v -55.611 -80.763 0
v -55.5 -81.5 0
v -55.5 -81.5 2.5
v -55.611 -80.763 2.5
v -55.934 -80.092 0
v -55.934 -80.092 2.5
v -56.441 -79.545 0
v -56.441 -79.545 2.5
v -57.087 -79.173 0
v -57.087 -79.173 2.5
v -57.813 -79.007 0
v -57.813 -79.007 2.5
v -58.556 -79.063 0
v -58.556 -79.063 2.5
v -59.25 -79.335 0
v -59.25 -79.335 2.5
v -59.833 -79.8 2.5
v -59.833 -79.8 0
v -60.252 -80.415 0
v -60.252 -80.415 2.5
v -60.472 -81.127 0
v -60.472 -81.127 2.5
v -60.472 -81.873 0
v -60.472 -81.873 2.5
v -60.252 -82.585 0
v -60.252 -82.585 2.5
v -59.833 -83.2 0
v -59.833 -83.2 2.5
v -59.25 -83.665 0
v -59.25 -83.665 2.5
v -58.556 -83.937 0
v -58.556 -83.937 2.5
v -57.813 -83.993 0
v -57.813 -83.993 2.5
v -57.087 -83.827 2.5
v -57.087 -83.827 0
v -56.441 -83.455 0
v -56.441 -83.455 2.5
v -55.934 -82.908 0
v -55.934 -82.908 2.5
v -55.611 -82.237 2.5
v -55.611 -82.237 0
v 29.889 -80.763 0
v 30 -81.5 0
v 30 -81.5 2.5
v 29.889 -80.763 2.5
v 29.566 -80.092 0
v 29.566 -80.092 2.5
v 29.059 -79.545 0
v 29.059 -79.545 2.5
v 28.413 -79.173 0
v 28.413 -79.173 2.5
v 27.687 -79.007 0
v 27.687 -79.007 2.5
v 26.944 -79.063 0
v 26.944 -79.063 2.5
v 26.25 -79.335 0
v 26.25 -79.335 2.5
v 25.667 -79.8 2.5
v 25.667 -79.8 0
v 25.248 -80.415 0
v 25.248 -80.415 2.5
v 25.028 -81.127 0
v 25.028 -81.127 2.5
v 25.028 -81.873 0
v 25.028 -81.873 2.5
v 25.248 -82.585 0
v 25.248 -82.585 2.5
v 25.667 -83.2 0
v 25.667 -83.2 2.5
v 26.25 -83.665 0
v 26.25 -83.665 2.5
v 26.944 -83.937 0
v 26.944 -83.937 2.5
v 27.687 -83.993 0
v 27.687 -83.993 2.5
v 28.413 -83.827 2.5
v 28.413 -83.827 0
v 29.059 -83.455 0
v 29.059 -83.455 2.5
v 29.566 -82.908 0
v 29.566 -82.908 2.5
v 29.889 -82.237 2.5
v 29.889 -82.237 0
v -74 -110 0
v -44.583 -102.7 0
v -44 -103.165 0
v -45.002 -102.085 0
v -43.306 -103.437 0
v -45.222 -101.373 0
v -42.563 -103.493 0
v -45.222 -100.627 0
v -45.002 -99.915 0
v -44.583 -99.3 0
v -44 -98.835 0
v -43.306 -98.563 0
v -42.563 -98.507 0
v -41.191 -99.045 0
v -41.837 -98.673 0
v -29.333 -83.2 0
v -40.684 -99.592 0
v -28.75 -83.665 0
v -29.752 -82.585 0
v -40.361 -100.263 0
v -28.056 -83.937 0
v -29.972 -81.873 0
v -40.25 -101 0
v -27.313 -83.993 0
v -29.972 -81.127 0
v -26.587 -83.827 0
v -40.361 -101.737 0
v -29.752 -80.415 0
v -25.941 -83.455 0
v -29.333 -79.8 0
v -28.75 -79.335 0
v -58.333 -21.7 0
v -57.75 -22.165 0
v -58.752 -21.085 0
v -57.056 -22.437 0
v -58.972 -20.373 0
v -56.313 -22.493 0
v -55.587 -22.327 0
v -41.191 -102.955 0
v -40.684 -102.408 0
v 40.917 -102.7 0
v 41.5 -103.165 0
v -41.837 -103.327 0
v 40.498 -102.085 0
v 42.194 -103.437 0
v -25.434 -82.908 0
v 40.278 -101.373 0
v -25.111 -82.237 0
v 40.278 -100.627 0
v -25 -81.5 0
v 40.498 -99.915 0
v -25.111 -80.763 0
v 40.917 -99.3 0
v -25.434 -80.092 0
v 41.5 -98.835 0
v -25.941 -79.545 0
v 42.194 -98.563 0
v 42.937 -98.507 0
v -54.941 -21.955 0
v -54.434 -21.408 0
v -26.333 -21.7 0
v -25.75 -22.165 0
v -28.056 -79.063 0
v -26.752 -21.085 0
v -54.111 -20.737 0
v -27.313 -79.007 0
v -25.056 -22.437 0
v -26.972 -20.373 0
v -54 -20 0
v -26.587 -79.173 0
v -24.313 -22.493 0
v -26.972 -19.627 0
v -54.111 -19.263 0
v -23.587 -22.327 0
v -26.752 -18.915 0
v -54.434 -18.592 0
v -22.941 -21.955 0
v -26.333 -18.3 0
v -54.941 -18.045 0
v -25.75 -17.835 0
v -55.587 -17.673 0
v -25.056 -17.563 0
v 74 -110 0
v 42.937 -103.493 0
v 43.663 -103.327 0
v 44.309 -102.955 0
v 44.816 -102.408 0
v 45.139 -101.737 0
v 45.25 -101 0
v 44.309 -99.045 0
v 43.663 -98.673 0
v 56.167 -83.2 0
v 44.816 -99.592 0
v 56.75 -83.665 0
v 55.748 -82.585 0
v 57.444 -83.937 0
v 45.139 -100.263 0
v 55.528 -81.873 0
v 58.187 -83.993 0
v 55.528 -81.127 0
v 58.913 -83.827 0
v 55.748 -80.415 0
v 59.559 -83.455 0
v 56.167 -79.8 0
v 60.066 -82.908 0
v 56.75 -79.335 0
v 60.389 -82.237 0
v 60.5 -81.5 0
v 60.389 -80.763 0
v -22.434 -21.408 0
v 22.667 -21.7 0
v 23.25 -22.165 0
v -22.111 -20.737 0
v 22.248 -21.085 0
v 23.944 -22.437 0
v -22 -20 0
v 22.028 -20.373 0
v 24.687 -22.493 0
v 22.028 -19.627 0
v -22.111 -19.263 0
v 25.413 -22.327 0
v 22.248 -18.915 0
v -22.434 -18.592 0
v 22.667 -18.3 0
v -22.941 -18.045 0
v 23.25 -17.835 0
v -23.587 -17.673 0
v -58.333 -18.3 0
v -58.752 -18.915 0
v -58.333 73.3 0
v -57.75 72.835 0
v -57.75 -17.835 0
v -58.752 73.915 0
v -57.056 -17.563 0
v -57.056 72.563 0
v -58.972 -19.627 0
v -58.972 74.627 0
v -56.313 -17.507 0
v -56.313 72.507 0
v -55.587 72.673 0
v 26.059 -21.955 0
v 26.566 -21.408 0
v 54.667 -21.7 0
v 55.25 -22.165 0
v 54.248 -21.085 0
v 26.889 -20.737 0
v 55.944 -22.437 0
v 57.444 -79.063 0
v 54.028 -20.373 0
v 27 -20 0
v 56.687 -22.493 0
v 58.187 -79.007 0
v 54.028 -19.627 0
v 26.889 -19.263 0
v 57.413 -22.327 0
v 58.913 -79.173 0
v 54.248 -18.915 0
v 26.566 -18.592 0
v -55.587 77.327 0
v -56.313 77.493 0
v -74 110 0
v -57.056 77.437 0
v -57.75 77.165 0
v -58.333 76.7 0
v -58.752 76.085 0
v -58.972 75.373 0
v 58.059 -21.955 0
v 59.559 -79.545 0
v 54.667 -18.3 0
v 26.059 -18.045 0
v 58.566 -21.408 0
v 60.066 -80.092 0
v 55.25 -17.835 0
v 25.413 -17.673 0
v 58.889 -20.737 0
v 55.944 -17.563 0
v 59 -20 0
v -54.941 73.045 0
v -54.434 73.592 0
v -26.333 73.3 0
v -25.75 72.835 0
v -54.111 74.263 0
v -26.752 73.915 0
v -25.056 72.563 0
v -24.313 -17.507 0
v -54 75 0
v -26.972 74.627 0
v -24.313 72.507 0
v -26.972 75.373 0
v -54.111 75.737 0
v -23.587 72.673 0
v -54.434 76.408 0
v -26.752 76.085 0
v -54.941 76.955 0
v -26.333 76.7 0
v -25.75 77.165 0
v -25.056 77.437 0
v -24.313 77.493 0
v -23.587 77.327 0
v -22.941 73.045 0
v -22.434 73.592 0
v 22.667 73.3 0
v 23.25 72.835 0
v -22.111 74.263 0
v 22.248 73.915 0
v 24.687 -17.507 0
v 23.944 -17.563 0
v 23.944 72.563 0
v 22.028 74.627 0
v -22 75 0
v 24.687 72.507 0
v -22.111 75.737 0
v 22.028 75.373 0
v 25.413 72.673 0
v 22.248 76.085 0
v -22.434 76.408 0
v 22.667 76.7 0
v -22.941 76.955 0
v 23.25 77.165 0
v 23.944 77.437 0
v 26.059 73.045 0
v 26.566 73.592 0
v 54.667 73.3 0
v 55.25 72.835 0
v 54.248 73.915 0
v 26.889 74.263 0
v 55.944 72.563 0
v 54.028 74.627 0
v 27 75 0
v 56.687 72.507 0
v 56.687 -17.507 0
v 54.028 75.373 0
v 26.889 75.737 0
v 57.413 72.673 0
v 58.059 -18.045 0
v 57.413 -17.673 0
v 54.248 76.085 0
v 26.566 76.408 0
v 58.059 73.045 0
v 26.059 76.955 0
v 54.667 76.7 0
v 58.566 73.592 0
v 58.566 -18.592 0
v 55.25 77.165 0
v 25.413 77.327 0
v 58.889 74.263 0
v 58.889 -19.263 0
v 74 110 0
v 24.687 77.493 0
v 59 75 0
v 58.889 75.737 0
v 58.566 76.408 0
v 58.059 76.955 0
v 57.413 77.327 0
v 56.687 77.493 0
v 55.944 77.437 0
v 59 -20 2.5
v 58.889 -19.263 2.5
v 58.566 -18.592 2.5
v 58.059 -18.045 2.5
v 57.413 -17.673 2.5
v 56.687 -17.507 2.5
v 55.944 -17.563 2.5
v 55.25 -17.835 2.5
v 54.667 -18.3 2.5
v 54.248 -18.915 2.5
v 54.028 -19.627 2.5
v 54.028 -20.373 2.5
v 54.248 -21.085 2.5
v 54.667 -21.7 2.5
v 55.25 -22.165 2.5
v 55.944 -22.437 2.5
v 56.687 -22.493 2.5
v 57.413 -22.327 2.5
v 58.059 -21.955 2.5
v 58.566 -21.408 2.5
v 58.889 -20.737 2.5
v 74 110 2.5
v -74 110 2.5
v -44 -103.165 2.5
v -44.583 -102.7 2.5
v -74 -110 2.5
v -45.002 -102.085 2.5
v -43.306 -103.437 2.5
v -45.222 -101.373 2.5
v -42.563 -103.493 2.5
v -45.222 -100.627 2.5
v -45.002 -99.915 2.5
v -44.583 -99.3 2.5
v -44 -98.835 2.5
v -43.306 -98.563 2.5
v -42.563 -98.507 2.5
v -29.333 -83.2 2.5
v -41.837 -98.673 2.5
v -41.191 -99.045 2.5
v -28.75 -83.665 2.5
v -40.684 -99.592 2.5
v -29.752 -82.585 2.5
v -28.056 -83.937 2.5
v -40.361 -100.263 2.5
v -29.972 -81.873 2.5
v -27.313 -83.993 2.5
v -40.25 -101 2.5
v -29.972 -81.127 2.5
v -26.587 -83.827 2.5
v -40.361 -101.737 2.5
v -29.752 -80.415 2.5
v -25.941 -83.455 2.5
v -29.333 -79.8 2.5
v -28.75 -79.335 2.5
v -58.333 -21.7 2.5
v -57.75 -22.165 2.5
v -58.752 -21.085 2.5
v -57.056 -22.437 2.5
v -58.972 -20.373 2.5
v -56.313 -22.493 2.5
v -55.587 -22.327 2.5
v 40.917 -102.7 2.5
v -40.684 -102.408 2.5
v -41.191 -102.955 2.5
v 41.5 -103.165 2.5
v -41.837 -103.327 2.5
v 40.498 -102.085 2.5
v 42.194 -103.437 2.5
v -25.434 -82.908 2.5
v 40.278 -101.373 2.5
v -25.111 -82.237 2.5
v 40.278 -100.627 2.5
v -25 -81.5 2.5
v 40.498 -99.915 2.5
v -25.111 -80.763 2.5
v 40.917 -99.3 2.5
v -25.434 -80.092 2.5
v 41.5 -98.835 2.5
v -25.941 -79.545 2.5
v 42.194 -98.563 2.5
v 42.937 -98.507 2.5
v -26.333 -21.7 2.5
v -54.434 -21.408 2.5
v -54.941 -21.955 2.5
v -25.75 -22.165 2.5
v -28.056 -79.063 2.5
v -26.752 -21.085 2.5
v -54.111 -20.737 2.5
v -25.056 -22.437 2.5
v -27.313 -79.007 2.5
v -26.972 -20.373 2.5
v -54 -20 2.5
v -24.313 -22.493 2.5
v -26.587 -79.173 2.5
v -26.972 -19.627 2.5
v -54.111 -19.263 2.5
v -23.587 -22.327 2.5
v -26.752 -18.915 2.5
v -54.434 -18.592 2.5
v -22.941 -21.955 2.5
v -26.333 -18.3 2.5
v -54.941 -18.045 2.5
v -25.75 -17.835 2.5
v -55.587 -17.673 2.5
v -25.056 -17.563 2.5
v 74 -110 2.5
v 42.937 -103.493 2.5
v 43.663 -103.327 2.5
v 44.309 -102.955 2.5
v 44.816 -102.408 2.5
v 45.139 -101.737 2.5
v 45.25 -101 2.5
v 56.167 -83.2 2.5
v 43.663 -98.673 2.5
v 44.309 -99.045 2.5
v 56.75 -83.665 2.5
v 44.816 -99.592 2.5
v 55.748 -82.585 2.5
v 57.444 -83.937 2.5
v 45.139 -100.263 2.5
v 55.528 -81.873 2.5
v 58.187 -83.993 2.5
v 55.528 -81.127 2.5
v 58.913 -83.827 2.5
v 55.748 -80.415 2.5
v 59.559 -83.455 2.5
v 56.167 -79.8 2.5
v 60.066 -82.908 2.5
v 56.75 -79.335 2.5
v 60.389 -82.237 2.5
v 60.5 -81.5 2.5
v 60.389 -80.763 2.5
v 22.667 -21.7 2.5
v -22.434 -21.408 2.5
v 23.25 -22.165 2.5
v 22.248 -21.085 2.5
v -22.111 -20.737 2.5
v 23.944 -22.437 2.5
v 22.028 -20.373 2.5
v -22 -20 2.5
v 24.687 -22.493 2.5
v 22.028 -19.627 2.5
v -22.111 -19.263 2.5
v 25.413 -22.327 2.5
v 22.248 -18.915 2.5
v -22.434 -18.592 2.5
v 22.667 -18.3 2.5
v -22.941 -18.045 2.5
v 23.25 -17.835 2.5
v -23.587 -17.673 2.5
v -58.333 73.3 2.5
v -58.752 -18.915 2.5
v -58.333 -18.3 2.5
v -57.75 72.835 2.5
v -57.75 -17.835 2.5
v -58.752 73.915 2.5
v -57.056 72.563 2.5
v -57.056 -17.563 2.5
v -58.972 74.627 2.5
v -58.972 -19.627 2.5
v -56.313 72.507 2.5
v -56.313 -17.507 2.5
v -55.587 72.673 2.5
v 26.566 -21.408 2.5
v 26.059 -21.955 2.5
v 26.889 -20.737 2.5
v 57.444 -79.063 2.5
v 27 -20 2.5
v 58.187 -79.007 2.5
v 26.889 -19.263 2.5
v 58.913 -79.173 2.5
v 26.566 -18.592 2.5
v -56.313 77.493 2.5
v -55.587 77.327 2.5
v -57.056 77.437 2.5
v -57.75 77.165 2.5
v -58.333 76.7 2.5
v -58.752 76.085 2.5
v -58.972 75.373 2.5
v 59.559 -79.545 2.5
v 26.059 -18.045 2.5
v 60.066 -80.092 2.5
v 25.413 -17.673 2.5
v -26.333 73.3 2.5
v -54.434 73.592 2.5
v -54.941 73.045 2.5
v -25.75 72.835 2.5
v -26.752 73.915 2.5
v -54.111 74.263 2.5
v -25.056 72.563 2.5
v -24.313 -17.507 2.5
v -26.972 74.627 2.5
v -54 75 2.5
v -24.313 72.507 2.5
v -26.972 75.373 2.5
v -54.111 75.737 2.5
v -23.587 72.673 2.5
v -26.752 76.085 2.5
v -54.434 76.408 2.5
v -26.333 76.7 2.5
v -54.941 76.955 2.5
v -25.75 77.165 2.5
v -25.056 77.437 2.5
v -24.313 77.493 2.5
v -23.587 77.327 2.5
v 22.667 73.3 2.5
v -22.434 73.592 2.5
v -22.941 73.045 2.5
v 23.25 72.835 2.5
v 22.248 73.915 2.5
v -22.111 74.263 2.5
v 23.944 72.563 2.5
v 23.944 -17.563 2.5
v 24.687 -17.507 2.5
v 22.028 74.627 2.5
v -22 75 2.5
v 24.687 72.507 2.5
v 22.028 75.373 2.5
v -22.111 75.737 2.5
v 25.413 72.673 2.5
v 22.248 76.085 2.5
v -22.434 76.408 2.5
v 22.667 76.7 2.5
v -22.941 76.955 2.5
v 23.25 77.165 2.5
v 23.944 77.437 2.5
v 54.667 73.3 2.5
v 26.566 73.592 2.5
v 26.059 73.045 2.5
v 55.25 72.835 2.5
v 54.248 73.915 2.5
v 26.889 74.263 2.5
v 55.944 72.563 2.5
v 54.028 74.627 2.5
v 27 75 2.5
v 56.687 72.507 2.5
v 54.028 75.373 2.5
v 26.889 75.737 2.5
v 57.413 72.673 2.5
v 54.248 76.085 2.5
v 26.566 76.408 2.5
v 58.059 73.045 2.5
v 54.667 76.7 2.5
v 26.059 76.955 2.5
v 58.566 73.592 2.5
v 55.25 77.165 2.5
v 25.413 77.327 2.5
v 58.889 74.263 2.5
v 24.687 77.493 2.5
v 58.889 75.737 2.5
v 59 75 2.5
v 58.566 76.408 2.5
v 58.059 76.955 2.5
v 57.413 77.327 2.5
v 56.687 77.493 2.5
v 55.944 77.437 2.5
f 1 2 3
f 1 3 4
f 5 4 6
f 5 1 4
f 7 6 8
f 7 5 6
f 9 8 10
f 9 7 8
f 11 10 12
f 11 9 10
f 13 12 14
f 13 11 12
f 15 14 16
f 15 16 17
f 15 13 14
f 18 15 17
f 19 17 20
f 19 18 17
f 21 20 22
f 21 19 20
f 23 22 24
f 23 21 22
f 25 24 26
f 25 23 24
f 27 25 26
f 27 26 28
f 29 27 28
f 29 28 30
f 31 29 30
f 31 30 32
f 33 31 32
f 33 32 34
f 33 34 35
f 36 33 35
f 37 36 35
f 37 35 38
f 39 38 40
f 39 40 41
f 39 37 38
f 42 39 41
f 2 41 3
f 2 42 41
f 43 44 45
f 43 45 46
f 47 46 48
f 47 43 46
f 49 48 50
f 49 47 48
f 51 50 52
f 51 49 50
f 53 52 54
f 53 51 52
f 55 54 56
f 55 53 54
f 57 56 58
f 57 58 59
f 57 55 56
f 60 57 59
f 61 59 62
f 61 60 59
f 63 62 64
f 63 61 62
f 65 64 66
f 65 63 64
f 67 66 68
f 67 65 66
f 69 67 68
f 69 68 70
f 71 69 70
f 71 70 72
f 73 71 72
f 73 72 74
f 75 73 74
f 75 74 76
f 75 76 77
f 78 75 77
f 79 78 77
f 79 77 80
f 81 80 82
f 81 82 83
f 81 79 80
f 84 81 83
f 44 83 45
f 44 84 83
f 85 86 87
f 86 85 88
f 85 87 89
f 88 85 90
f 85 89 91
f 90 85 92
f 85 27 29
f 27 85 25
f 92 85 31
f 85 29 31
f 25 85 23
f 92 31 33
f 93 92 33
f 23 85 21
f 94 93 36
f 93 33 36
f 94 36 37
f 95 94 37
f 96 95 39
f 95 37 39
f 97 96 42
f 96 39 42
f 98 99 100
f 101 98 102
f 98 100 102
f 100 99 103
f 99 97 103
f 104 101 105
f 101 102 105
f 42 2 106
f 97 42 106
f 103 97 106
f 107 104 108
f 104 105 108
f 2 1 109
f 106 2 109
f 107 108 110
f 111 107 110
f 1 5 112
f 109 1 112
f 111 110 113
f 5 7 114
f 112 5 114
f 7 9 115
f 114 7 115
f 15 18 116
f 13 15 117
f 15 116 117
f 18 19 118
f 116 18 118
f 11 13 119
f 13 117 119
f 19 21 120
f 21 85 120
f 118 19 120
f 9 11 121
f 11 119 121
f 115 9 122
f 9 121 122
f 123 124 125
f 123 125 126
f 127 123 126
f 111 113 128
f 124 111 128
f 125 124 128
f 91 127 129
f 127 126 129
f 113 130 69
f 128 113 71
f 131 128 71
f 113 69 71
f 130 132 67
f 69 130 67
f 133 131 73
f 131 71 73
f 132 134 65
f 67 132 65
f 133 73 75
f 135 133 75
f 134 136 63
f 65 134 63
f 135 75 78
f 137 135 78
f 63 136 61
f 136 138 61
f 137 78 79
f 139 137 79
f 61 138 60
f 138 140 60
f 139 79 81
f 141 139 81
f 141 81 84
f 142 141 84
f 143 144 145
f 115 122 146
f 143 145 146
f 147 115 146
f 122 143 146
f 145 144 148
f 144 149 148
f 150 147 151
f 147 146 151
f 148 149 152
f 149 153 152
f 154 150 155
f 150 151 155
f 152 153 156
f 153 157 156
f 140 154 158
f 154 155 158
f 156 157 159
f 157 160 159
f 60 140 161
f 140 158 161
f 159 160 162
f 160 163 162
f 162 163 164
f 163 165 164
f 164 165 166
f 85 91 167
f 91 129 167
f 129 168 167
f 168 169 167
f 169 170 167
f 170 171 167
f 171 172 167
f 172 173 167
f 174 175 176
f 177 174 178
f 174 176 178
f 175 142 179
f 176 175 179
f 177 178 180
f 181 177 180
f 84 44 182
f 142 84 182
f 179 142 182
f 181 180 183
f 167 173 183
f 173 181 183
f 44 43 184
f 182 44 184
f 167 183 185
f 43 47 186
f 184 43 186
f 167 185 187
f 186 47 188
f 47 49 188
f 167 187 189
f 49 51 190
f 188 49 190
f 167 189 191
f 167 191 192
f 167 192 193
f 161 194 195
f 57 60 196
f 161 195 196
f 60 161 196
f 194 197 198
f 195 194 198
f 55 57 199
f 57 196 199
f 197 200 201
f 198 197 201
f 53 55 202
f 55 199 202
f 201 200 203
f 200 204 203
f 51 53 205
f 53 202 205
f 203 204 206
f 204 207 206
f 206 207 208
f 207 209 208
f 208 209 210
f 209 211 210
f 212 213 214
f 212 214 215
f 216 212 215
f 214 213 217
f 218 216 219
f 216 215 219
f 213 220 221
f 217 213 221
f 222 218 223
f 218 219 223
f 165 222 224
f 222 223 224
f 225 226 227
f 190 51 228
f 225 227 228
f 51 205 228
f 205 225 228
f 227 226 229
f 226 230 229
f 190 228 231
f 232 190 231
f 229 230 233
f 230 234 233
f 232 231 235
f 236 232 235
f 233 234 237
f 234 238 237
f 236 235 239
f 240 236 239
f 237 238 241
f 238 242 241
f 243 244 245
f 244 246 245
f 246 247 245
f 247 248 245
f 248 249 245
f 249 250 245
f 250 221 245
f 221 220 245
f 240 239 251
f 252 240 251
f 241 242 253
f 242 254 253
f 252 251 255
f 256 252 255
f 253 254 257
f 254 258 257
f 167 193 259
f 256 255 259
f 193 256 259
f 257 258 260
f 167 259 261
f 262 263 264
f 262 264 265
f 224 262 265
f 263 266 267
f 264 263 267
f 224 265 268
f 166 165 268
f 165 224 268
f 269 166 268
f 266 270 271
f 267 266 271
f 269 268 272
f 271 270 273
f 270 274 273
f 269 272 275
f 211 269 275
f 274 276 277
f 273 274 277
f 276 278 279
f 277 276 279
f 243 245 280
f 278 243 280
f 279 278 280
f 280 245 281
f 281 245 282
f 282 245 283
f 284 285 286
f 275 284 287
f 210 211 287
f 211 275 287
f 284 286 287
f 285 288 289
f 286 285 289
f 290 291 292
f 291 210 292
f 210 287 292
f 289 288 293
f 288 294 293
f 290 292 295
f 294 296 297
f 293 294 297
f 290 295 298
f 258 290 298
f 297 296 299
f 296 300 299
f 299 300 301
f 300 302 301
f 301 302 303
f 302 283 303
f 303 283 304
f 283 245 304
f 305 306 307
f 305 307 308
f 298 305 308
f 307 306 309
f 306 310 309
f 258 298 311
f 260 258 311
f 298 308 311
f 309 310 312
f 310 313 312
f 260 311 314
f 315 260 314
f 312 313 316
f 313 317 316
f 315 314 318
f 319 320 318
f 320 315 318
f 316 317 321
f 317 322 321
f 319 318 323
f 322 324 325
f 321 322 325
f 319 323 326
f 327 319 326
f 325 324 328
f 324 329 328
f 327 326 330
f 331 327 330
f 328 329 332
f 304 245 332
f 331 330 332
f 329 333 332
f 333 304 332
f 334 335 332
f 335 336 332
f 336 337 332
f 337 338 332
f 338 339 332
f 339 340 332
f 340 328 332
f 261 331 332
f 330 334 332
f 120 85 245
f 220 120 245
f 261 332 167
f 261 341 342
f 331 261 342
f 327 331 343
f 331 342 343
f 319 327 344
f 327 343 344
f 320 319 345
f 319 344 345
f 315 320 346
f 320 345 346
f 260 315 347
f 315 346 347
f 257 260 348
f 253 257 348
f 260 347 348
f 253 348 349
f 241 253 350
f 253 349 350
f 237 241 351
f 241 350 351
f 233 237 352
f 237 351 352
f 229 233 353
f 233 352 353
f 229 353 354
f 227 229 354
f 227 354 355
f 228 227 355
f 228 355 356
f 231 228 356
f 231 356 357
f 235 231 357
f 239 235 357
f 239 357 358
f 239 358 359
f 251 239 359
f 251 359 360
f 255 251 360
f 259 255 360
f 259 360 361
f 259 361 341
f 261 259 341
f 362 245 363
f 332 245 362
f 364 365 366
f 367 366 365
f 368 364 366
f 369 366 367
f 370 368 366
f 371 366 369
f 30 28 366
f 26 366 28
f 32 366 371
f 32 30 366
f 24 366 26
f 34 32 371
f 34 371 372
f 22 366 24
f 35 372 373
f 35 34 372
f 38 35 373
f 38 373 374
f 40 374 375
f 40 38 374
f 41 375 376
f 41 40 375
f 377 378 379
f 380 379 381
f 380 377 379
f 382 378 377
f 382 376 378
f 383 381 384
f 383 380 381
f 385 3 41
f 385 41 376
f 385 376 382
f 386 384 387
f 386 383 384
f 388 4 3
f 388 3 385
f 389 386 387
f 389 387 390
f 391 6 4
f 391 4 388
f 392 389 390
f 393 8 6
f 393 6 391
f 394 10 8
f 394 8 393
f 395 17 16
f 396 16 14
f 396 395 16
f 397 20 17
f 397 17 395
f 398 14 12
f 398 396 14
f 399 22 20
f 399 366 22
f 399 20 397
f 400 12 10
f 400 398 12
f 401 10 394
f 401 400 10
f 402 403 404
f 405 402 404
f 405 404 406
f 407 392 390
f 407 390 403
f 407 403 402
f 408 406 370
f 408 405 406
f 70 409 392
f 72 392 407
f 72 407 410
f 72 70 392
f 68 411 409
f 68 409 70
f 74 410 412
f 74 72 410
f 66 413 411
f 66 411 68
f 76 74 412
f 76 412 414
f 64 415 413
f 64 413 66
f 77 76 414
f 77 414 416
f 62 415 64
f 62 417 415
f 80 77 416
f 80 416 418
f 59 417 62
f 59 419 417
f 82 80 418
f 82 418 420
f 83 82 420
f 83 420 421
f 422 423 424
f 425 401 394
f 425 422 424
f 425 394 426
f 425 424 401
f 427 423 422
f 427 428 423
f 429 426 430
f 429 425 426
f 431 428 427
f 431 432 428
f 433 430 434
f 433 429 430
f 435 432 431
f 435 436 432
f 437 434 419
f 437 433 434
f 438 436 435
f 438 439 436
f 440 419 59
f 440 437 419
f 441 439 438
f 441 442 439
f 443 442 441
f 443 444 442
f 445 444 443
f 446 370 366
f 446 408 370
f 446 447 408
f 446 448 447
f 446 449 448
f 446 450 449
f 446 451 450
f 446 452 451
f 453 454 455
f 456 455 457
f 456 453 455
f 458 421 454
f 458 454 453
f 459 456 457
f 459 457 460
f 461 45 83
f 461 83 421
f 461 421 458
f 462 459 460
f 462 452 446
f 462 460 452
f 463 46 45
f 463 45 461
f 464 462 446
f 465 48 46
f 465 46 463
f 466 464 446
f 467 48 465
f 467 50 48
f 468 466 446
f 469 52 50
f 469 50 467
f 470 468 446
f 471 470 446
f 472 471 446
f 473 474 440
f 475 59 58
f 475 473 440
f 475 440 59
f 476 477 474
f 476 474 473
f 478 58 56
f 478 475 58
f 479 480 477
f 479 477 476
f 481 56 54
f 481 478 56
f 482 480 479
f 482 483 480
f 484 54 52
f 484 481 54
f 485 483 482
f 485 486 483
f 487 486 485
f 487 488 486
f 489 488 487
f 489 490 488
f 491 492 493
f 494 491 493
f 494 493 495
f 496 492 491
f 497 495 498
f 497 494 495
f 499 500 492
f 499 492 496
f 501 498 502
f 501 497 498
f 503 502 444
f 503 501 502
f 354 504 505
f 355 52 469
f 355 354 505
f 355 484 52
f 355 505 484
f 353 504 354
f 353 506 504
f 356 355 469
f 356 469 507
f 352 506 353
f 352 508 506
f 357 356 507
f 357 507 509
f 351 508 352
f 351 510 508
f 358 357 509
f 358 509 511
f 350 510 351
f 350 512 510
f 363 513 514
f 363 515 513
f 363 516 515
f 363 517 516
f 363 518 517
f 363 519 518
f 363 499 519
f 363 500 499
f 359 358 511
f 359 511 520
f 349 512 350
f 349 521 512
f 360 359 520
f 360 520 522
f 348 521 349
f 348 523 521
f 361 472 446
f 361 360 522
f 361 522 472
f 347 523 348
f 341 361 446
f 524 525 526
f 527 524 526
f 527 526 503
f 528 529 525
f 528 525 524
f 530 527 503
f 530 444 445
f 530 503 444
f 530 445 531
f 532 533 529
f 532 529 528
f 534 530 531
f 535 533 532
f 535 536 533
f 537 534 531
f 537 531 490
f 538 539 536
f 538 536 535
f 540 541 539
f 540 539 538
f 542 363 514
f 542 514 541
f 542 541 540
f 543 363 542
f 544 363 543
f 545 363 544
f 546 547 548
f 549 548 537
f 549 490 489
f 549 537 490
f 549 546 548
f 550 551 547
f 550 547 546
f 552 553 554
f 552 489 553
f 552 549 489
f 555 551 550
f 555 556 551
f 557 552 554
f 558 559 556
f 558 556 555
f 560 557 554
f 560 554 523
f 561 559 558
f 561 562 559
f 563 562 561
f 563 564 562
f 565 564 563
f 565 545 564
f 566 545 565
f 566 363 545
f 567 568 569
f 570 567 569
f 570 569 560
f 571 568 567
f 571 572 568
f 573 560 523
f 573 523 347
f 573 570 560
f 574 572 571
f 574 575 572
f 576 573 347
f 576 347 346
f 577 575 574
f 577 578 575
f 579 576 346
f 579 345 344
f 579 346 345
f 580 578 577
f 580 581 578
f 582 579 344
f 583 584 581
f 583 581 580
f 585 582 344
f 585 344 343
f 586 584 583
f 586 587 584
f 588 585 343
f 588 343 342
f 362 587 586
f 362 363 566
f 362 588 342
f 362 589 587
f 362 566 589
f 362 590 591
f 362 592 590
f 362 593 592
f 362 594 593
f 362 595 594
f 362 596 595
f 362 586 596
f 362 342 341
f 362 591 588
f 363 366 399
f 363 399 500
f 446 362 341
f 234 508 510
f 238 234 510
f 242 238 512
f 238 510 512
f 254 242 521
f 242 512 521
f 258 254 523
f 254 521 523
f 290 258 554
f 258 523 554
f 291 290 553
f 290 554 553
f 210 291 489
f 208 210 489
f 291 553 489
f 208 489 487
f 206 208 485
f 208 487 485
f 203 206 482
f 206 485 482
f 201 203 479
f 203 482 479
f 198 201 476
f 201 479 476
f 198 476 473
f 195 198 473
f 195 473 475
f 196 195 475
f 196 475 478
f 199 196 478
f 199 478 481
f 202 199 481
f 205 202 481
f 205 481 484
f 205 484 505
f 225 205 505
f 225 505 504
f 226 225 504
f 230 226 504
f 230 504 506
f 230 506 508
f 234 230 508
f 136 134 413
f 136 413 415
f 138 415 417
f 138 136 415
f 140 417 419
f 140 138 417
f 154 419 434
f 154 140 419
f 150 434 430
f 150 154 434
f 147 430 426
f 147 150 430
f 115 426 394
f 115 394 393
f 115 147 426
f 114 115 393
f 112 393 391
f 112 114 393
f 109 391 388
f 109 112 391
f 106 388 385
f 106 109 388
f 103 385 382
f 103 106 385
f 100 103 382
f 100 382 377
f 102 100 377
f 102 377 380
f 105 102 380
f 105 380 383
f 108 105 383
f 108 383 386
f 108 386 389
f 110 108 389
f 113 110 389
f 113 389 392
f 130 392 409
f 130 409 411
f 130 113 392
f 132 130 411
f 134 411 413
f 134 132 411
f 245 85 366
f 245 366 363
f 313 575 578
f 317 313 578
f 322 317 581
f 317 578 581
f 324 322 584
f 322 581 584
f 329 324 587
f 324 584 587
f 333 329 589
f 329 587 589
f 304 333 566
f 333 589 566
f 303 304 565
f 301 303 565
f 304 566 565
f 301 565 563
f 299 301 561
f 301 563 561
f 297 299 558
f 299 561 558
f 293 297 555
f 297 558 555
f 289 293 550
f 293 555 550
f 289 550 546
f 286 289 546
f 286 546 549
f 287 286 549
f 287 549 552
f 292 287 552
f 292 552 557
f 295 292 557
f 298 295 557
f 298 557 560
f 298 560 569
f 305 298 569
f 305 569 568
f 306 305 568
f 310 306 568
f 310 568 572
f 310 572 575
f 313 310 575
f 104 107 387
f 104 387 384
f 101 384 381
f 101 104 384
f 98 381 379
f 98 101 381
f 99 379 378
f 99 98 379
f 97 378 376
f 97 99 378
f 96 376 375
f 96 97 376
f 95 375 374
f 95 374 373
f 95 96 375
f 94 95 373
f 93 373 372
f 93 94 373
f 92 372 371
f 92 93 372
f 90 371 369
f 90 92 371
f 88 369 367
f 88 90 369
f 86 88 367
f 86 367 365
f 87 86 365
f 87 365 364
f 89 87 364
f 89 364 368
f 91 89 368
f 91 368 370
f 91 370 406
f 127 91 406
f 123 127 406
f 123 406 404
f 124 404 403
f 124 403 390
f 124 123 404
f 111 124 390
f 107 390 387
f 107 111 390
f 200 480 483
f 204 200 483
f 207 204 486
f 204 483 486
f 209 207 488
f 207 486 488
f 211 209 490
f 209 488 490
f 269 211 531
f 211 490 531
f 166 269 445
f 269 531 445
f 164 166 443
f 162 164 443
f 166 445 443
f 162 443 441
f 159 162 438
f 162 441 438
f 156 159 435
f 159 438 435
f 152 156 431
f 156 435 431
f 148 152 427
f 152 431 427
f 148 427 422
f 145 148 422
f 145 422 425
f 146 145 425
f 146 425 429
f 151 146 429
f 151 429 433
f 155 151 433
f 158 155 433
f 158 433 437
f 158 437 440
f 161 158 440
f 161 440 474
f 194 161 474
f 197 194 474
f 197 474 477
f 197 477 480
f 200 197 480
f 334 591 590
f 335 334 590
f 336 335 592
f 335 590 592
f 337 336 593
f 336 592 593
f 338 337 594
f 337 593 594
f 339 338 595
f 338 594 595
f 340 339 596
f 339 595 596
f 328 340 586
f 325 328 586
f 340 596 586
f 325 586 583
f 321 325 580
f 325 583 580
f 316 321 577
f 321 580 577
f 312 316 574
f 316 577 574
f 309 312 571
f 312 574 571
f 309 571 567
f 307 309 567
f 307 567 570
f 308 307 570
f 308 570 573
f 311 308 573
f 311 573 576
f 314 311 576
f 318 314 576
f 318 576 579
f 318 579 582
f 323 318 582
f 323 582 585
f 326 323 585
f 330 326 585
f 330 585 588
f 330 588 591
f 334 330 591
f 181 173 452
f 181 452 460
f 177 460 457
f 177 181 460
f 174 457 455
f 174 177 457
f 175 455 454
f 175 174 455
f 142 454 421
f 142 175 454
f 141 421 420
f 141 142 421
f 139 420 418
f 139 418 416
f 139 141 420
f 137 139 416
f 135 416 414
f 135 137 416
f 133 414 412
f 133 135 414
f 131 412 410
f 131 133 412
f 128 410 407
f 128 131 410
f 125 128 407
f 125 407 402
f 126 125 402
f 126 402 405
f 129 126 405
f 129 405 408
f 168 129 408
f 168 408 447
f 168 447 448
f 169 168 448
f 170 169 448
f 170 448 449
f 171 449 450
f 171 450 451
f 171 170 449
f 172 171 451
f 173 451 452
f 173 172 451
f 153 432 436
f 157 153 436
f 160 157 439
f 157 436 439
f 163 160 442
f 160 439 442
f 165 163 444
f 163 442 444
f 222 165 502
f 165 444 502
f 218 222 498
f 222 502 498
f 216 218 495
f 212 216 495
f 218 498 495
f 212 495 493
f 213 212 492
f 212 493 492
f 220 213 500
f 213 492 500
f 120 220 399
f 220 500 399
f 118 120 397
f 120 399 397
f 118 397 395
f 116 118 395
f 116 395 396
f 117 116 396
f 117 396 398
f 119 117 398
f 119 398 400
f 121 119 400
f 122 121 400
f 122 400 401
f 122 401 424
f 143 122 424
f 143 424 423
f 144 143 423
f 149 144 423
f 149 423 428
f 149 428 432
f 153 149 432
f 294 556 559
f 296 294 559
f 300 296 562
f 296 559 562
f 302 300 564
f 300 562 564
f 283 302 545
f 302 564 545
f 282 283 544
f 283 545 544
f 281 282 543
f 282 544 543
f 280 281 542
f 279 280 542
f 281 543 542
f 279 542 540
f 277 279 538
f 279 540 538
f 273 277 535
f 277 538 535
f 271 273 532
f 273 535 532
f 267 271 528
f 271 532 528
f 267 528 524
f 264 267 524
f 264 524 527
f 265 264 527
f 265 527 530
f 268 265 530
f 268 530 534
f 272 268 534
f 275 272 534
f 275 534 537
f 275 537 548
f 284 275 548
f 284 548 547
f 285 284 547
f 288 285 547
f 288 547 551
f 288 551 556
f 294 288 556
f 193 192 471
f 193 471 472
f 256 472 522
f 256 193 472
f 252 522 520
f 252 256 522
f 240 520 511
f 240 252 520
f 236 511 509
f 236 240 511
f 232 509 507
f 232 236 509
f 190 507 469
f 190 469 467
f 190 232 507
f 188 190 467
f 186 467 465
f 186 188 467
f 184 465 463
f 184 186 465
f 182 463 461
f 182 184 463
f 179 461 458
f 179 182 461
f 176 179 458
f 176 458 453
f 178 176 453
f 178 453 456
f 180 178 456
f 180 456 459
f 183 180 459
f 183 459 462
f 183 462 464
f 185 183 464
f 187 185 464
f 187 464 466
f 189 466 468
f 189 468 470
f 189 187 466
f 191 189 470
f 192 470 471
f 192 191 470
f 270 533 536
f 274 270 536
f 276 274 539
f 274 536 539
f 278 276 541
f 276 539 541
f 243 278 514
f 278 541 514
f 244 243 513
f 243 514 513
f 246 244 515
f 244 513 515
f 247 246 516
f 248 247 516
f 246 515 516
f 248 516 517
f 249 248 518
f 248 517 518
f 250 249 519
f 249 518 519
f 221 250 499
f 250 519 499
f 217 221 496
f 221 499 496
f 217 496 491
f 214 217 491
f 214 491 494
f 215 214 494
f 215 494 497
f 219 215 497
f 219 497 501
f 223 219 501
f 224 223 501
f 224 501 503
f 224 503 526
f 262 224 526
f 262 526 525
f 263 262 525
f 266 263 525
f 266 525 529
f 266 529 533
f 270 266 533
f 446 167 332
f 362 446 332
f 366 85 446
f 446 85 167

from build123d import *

# Parameters (mm, degrees)
SKETCH_1_W          = 148
SKETCH_1_H          = 220
SKETCH_1_R          = 2.5
EXTRUDE_1_DEPTH     = 2.5
SKETCH_2_R          = 2.5
CUT_EXTRUDE_1_DEPTH = 3


with BuildPart() as part:
    # 草图1 → 凸台-拉伸1 (new body)
    with BuildSketch(Plane.XY):
        Rectangle(SKETCH_1_W, SKETCH_1_H)
        with Locations((-58, -81.5)):
            Circle(SKETCH_1_R, mode=Mode.SUBTRACT)
        with Locations((-27.5, -81.5)):
            Circle(SKETCH_1_R, mode=Mode.SUBTRACT)
        with Locations((-42.75, -101)):
            Circle(SKETCH_1_R, mode=Mode.SUBTRACT)
        with Locations((42.75, -101)):
            Circle(SKETCH_1_R, mode=Mode.SUBTRACT)
        with Locations((58, -81.5)):
            Circle(SKETCH_1_R, mode=Mode.SUBTRACT)
        with Locations((27.5, -81.5)):
            Circle(SKETCH_1_R, mode=Mode.SUBTRACT)
    extrude(amount=EXTRUDE_1_DEPTH)

    # 草图2 → 切除-拉伸1 (cut)
    with BuildSketch(Plane.XY.offset(2.5)):
        with Locations((-56.5, -20)):
            Circle(SKETCH_2_R)
        with Locations((-24.5, -20)):
            Circle(SKETCH_2_R)
        with Locations((-56.5, 75)):
            Circle(SKETCH_2_R)
        with Locations((-24.5, 75)):
            Circle(SKETCH_2_R)
        with Locations((-56.5, 170)):
            Circle(SKETCH_2_R)
        with Locations((-24.5, 170)):
            Circle(SKETCH_2_R)
        with Locations((24.5, 170)):
            Circle(SKETCH_2_R)
        with Locations((56.5, 170)):
            Circle(SKETCH_2_R)
        with Locations((24.5, 75)):
            Circle(SKETCH_2_R)
        with Locations((56.5, 75)):
            Circle(SKETCH_2_R)
        with Locations((24.5, -20)):
            Circle(SKETCH_2_R)
        with Locations((56.5, -20)):
            Circle(SKETCH_2_R)
    extrude(amount=-CUT_EXTRUDE_1_DEPTH, mode=Mode.SUBTRACT)


solid = part.part
